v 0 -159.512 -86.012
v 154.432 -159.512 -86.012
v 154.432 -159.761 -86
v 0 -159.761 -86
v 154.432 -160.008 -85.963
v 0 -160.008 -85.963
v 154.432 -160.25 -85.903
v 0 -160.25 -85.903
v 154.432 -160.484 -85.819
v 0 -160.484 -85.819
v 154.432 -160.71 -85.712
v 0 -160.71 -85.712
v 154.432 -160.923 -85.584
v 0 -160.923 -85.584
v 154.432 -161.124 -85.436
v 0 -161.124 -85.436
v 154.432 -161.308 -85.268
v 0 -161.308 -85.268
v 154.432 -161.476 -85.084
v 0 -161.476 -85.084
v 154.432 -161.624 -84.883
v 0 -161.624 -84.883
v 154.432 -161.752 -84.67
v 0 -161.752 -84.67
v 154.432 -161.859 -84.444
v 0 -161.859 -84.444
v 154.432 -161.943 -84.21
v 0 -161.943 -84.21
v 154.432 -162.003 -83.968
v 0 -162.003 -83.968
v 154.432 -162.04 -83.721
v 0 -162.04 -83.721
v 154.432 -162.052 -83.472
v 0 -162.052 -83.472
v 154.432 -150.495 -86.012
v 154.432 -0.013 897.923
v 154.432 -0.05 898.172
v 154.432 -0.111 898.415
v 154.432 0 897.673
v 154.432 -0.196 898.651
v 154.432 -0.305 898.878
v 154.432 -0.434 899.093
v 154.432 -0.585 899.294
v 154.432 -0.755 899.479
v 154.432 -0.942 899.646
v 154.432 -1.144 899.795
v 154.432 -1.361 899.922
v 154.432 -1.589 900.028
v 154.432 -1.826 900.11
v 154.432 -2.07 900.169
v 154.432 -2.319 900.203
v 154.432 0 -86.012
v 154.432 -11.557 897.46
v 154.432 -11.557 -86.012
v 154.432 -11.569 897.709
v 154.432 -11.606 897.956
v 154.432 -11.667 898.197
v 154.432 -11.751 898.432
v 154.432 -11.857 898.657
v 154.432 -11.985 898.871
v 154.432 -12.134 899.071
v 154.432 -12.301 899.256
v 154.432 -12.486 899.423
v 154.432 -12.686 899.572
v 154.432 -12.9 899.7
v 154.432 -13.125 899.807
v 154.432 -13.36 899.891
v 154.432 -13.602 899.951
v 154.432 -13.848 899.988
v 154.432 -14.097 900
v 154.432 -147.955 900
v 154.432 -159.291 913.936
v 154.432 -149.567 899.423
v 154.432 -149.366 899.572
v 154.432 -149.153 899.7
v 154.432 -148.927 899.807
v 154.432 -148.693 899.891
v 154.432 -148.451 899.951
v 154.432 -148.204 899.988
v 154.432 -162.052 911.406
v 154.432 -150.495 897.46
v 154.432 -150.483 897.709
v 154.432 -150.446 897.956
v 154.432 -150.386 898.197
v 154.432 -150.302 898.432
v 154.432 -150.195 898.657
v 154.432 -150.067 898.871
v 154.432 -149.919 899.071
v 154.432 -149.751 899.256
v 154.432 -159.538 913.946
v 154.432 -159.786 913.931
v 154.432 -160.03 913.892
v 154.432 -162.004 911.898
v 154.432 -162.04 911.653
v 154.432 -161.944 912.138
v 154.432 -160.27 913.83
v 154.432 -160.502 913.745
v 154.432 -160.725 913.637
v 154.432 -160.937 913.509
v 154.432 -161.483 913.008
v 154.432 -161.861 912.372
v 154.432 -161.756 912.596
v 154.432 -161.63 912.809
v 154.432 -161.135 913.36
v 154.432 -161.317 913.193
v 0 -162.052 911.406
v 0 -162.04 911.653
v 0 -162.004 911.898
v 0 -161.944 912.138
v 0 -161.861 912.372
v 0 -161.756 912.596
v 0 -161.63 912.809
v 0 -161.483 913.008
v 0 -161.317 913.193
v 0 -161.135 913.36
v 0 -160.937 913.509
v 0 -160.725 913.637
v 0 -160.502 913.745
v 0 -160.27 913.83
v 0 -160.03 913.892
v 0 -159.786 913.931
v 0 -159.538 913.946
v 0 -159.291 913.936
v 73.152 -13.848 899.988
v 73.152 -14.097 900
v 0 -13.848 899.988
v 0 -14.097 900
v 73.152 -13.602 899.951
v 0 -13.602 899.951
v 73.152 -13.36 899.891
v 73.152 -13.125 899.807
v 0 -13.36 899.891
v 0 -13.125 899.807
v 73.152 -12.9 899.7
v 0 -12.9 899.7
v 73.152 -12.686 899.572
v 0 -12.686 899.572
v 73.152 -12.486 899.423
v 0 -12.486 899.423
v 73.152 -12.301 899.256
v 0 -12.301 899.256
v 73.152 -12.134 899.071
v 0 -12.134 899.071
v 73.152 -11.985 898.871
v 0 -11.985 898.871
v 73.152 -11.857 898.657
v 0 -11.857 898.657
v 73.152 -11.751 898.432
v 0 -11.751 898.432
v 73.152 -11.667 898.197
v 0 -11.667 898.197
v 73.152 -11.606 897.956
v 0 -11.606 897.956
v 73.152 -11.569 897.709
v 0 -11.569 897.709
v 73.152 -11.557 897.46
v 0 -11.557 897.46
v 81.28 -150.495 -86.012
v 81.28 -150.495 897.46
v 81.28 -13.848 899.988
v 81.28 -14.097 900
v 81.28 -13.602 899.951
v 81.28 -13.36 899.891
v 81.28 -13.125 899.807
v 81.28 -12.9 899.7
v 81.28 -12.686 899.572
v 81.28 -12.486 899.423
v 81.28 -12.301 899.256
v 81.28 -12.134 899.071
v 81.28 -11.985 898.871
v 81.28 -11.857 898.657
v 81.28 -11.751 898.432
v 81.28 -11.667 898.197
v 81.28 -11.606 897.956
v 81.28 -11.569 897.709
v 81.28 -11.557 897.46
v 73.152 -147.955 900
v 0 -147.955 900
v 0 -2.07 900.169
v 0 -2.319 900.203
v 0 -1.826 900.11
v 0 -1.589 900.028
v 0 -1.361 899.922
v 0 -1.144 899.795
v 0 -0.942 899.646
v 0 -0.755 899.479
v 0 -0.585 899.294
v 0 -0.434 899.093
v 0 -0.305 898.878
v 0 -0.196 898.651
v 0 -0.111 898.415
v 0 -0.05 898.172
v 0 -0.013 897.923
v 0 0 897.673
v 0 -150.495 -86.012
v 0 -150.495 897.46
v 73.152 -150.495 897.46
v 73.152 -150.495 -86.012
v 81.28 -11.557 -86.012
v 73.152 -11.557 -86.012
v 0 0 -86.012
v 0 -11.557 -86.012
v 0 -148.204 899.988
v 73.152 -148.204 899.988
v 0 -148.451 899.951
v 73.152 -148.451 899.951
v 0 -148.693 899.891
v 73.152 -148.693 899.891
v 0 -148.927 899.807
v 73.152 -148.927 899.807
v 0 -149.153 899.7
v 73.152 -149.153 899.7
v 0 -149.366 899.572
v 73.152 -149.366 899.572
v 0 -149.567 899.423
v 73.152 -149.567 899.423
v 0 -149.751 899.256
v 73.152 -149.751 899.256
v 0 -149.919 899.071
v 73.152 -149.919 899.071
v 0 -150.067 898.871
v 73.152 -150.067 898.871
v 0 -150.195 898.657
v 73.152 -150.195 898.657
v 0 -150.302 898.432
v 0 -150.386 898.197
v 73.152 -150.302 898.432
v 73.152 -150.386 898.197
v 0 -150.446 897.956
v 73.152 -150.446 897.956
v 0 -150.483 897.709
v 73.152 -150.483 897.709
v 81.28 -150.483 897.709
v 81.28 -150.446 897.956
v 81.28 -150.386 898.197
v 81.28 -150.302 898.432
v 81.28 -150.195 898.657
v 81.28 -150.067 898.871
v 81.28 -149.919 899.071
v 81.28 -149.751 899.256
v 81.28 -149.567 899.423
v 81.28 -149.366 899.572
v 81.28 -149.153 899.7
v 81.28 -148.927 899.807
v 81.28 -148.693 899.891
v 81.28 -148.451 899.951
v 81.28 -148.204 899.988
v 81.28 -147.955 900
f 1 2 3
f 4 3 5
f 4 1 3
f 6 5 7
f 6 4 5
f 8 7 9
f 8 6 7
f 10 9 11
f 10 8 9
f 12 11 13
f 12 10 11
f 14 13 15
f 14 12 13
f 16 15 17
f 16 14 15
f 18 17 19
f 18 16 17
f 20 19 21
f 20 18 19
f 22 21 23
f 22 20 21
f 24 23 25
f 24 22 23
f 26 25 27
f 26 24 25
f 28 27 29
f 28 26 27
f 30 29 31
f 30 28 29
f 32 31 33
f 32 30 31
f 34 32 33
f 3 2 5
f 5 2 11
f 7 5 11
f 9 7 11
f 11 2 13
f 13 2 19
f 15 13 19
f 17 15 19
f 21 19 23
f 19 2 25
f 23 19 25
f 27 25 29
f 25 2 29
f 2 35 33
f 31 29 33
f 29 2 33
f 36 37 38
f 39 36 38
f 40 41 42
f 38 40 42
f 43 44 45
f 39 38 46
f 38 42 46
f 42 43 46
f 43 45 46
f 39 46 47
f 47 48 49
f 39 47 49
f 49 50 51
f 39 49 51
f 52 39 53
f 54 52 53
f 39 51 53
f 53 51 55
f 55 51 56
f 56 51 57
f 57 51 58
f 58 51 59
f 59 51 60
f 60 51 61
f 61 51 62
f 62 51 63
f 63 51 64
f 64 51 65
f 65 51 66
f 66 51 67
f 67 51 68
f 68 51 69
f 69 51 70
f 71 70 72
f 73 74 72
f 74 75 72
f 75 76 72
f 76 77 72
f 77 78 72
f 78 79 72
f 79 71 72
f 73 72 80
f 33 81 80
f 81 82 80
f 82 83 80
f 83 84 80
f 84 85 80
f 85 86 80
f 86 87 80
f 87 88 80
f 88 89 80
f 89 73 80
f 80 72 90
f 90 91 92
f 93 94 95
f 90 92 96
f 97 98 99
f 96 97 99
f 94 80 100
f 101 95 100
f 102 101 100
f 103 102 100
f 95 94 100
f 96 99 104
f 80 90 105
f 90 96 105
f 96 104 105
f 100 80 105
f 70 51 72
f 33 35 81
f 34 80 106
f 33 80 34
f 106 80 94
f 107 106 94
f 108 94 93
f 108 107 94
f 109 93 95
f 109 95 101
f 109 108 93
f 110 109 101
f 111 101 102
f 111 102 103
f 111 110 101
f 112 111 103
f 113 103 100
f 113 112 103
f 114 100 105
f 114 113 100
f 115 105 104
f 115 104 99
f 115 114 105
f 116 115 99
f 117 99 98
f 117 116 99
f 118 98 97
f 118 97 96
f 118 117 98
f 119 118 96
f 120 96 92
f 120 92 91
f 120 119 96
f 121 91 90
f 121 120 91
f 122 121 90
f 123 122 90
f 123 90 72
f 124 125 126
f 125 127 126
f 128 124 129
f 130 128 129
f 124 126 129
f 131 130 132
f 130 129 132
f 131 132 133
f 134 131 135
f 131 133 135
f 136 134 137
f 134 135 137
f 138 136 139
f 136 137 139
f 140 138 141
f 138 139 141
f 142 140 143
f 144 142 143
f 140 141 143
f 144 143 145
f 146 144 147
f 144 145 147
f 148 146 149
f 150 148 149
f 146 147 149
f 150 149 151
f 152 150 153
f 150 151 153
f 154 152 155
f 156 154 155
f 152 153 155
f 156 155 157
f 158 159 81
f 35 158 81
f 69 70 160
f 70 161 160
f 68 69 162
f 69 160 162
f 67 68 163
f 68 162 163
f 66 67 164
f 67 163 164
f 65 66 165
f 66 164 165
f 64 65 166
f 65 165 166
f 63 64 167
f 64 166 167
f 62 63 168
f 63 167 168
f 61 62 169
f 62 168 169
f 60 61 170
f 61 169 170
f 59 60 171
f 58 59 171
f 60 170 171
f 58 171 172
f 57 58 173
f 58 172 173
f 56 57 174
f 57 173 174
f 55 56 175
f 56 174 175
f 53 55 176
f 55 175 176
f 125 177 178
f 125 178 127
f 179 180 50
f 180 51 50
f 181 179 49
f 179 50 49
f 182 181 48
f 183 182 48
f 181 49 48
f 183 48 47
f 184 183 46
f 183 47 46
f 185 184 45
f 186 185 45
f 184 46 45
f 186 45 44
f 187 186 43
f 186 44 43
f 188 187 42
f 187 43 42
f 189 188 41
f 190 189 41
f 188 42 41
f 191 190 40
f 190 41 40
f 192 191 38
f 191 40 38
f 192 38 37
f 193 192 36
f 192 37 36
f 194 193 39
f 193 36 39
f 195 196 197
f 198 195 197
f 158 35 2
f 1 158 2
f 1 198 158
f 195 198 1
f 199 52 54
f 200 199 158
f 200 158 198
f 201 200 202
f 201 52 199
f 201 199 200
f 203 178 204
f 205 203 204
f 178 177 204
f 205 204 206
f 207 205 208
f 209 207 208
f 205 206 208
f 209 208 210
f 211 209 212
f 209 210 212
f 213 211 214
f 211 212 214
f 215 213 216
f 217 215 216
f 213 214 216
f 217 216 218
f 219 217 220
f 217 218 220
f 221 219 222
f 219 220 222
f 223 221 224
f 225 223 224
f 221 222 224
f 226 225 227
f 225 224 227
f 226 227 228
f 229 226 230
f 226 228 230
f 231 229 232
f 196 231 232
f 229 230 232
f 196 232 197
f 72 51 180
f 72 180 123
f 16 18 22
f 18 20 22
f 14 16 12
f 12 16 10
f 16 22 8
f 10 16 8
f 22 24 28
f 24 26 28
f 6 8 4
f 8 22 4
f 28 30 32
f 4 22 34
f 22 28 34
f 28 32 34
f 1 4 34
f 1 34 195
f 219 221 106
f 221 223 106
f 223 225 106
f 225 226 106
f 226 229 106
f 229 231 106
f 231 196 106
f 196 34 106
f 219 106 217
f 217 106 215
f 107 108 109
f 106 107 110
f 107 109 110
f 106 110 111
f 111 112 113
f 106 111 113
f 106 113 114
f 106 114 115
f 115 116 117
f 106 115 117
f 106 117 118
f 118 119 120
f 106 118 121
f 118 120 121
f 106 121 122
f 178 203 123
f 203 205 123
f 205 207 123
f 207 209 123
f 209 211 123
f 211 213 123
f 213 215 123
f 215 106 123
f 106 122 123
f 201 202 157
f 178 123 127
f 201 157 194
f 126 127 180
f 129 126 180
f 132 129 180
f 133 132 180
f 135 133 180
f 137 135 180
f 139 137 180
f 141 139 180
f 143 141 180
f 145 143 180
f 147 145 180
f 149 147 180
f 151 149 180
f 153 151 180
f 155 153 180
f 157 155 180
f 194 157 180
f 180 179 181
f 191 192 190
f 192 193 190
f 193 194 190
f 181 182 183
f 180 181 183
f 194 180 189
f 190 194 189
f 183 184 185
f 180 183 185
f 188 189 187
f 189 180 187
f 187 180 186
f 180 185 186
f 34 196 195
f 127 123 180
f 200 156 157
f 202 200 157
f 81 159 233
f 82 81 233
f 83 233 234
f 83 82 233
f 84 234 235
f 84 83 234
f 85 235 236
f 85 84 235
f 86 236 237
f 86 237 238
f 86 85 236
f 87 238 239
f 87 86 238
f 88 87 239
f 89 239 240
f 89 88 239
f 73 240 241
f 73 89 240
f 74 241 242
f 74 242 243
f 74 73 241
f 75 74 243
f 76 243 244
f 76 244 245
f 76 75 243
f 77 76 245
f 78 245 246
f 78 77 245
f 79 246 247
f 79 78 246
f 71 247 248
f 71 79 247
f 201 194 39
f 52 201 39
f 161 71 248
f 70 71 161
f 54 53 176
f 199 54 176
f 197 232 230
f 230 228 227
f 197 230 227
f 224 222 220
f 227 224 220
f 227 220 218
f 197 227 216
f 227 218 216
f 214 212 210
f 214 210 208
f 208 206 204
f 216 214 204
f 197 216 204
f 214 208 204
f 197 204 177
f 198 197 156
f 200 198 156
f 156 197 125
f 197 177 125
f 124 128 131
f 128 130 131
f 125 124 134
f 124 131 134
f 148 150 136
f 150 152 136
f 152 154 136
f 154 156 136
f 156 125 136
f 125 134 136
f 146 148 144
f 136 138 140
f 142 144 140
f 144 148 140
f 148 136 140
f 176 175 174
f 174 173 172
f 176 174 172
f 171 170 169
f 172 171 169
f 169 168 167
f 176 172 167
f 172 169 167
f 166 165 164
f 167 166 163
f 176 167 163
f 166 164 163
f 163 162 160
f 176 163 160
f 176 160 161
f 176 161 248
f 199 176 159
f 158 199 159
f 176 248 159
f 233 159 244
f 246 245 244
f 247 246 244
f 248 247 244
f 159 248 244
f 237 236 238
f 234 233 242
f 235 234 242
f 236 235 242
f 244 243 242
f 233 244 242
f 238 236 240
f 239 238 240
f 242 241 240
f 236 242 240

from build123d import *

# Parameters (mm, degrees)
BOSS_EXTRUDE1_DEPTH = 900
BOSS_EXTRUDE7_DEPTH = 154.432
BOSS_EXTRUDE9_DEPTH = 86.012287
FILLET1_R           = 2.54
FILLET2_R           = 2.54


with BuildPart() as part:
    # Sketch1 → Boss-Extrude1 (new body)
    with BuildSketch(Plane.XY):
        Polygon((0, -0.000240533), (154.432, -0.000240533), (154.432, -11.557240533), (81.28, -11.557240533), (81.28, -150.495240533), (154.432, -150.495240533), (154.432, -162.052240533), (0, -162.052240533), (0, -150.495240533), (73.152, -150.495240533), (73.152, -11.557240533), (0, -11.557240533), align=None)
    extrude(amount=BOSS_EXTRUDE1_DEPTH)

    # Sketch4 → Boss-Extrude7 (add)
    with BuildSketch(Plane(origin=(154.432, 0, 0), x_dir=(0, 0, -1), z_dir=(1, 0, 0))):
        Polygon((-900, -0.000240533), (-914.177712902, -162.052240533), (-900, -162.052240533), align=None)
    extrude(amount=-BOSS_EXTRUDE7_DEPTH)

    # Sketch6 → Boss-Extrude9 (add)
    with BuildSketch(Plane(origin=(0, 0, 0), x_dir=(-1, 0, 0), z_dir=(0, 0, -1))):
        Polygon((0, -11.557240533), (0, -0.000240533), (-154.432, -0.000240533), (-154.432, -11.557240533), (-81.28, -11.557240533), (-81.28, -150.495240533), (-154.432, -150.495240533), (-154.432, -162.052240533), (0, -162.052240533), (0, -150.495240533), (-73.152, -150.495240533), (-73.152, -11.557240533), align=None)
    extrude(amount=BOSS_EXTRUDE9_DEPTH)

    # Fillet1
    fillet1_edges = [part.edges().sort_by_distance(p)[0] for p in [
        (36.576, -150.495240533, 900),
        (117.856, -150.495240533, 900),
        (117.856, -11.557240533, 900),
        (77.216, -162.052240533, 914.177712902),
        (77.216, -0.000240533, 900),
        (36.576, -11.557240533, 900),
    ]]
    fillet(fillet1_edges, radius=FILLET1_R)

    # Fillet2
    fillet2_edges = [part.edges().sort_by_distance(p)[0] for p in [
        (77.216, -162.052240533, -86.012287),
    ]]
    fillet(fillet2_edges, radius=FILLET2_R)


solid = part.part
